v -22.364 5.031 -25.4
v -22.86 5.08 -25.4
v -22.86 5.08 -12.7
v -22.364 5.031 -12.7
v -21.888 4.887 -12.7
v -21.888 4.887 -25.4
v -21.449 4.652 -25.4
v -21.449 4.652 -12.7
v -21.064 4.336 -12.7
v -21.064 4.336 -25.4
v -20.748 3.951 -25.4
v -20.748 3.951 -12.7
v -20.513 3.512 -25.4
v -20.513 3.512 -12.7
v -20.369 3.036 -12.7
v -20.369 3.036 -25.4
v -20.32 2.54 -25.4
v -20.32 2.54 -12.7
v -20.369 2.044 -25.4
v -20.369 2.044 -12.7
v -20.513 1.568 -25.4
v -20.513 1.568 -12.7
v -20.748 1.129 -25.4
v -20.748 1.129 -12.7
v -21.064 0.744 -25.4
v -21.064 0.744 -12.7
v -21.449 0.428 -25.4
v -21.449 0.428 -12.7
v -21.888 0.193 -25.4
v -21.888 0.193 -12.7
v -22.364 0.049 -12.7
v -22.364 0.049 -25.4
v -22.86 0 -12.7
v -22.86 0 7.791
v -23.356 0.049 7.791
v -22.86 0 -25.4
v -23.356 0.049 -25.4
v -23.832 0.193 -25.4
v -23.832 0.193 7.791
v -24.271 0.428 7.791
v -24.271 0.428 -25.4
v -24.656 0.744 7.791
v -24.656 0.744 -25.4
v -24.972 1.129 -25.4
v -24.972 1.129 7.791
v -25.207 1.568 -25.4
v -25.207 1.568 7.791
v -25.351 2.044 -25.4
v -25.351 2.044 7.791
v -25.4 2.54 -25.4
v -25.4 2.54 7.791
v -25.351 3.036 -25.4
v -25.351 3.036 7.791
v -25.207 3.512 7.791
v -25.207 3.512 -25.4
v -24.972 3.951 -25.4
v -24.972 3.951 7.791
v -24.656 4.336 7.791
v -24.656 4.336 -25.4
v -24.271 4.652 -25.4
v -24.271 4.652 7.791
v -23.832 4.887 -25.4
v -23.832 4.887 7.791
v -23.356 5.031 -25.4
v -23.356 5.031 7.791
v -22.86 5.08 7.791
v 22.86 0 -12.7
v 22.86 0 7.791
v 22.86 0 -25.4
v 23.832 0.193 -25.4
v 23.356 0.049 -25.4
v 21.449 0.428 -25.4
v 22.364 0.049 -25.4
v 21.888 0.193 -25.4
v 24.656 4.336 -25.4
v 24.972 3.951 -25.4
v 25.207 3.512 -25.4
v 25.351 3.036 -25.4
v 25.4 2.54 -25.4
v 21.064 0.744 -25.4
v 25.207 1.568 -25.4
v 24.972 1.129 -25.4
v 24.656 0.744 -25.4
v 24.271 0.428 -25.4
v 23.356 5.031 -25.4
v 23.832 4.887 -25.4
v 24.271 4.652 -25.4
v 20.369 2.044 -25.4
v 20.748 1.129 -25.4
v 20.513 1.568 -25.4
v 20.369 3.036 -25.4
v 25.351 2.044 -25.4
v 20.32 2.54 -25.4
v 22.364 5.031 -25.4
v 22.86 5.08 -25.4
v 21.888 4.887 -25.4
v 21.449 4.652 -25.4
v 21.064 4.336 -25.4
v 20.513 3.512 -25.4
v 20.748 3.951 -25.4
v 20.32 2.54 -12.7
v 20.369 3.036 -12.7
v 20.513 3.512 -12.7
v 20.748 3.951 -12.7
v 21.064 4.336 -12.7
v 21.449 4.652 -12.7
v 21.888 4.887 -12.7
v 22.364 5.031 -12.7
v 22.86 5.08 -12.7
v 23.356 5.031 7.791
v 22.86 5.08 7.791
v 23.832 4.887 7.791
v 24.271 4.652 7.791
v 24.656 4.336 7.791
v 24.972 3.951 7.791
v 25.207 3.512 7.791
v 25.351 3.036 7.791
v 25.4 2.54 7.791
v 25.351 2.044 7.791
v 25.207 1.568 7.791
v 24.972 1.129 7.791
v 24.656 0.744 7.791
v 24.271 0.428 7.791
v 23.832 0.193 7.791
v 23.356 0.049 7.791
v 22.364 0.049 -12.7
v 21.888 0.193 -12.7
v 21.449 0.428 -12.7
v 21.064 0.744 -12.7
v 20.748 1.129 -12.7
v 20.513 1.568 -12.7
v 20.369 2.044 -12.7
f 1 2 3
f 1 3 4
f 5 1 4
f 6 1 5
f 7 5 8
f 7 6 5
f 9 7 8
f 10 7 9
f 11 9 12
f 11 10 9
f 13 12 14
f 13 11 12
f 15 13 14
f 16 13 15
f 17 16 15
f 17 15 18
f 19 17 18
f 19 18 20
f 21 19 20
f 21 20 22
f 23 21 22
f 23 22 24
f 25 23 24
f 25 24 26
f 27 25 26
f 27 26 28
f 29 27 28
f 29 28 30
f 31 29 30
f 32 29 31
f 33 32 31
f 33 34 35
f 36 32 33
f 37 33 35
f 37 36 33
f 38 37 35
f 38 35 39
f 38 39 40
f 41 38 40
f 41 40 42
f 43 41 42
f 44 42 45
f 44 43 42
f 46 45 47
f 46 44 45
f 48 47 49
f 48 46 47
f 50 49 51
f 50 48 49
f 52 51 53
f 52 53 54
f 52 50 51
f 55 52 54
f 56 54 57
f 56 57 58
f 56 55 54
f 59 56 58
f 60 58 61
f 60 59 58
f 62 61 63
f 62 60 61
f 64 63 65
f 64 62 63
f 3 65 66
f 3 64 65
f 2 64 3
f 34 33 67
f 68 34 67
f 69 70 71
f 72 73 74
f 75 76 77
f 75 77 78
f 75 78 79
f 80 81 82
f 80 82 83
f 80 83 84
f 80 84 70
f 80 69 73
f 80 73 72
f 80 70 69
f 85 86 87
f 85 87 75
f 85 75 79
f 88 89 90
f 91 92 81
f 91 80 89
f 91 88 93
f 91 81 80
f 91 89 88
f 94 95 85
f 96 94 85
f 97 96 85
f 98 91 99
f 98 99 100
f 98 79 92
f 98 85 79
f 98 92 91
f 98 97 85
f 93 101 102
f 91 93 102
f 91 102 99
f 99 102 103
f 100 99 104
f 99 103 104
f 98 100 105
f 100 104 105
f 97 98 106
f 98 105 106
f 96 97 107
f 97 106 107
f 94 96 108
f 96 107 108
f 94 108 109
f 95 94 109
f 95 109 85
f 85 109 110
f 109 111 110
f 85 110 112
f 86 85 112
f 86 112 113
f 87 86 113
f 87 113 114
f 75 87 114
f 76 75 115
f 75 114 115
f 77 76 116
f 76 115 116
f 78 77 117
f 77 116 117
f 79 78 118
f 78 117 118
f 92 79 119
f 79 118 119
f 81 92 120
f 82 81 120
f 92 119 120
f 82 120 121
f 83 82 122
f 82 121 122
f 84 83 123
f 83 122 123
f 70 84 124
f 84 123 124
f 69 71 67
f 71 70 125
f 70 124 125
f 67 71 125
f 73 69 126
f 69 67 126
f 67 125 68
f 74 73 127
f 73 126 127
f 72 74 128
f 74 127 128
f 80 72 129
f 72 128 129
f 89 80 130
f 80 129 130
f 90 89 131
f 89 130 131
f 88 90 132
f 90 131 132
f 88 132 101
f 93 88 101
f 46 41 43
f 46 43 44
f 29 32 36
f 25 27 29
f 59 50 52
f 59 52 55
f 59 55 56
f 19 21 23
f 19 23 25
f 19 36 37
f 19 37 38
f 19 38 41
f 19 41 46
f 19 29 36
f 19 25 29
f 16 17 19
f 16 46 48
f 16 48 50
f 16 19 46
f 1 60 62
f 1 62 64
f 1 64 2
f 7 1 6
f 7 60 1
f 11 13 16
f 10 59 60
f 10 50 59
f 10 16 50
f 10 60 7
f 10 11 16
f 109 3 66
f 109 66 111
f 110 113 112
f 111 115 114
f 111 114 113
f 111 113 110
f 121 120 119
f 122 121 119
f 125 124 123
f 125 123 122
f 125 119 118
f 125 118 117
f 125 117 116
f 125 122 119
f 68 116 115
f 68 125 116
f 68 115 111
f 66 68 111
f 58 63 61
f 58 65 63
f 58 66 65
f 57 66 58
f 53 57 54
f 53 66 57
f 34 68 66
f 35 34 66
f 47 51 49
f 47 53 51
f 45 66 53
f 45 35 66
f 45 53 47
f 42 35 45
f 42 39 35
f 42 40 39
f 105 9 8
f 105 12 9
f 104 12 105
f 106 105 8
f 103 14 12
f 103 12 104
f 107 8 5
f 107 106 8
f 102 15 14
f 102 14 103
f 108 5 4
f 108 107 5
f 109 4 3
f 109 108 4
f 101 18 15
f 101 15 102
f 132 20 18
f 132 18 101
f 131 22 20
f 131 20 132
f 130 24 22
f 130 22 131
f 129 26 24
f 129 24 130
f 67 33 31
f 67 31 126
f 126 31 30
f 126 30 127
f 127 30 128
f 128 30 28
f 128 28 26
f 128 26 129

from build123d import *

# Parameters (mm, degrees)
SKETCH1_W           = 50.8
SKETCH1_H           = 25.4
BOSS_EXTRUDE1_DEPTH = 5.08
FILLET2_RADIUS      = 2.54
FILLET2_LENGTH      = 25.4
FILLET3_RADIUS      = 2.54
FILLET3_LENGTH      = 25.4
SKETCH2_R           = 2.54
BOSS_EXTRUDE2_DEPTH = 12.7
BOSS_EXTRUDE3_START = 12.7
SKETCH3_R           = 2.54
BOSS_EXTRUDE3_DEPTH = 12.7
SKETCH4_W           = 52.876932696
SKETCH4_H           = 9.818783706
CUT_EXTRUDE1_DEPTH  = 12.7


with BuildPart() as part:
    # Sketch1 → Boss-Extrude1 (new body)
    with BuildSketch(Plane(origin=(0, 0, 0), x_dir=(1, 0, 0), z_dir=(0, 1, 0))):
        Rectangle(SKETCH1_W, SKETCH1_H)
    extrude(amount=BOSS_EXTRUDE1_DEPTH)

    # Fillet2: full round fillet: the end face becomes a half cylinder, R = half its width
    fillet2_face = Plane((-25.4, 2.54, 0), x_dir=(0, 0, -1), z_dir=(-1, 0, 0))  # on the end face: x along it, z out of the body
    fillet2_slab = fillet2_face.offset(-FILLET2_RADIUS / 2) * Box(FILLET2_LENGTH, 2 * FILLET2_RADIUS, FILLET2_RADIUS, mode=Mode.PRIVATE)  # the body's end, R deep
    fillet2_round = Plane((-22.86, 2.54, 0), x_dir=(-1, 0, 0), z_dir=(0, 0, -1)) * Cylinder(FILLET2_RADIUS, FILLET2_LENGTH, mode=Mode.PRIVATE)  # its axis R under the face
    add(fillet2_slab - fillet2_round, mode=Mode.SUBTRACT)

    # Fillet3: full round fillet: the end face becomes a half cylinder, R = half its width
    fillet3_face = Plane((25.4, 2.54, 0), x_dir=(0, 0, 1), z_dir=(1, 0, 0))  # on the end face: x along it, z out of the body
    fillet3_slab = fillet3_face.offset(-FILLET3_RADIUS / 2) * Box(FILLET3_LENGTH, 2 * FILLET3_RADIUS, FILLET3_RADIUS, mode=Mode.PRIVATE)  # the body's end, R deep
    fillet3_round = Plane((22.86, 2.54, 0), x_dir=(1, 0, 0), z_dir=(0, 0, 1)) * Cylinder(FILLET3_RADIUS, FILLET3_LENGTH, mode=Mode.PRIVATE)  # its axis R under the face
    add(fillet3_slab - fillet3_round, mode=Mode.SUBTRACT)

    # Sketch2 → Boss-Extrude2 (add)
    with BuildSketch(Plane(origin=(0, 0, -12.7), x_dir=(-1, 0, 0), z_dir=(0, 0, -1))):
        with Locations((-22.86, 2.54)):
            Circle(SKETCH2_R)
    extrude(amount=BOSS_EXTRUDE2_DEPTH)

    # Sketch3 → Boss-Extrude3 (add)
    with BuildSketch(Plane(origin=(0, 0, -12.7), x_dir=(-1, 0, 0), z_dir=(0, 0, -1)).offset(BOSS_EXTRUDE3_START)):
        with Locations(Location((22.86, 2.54, 0), (0, 0, 90))):
            Circle(SKETCH3_R)
    extrude(amount=-BOSS_EXTRUDE3_DEPTH)

    # Sketch4 → Cut-Extrude1 (cut)
    with BuildSketch(Plane(origin=(0, 0, 0), x_dir=(-1, 0, 0), z_dir=(0, -1, 0))):
        with Locations((0, -12.7)):
            Rectangle(SKETCH4_W, SKETCH4_H)
    extrude(amount=-CUT_EXTRUDE1_DEPTH, mode=Mode.SUBTRACT)


solid = part.part
